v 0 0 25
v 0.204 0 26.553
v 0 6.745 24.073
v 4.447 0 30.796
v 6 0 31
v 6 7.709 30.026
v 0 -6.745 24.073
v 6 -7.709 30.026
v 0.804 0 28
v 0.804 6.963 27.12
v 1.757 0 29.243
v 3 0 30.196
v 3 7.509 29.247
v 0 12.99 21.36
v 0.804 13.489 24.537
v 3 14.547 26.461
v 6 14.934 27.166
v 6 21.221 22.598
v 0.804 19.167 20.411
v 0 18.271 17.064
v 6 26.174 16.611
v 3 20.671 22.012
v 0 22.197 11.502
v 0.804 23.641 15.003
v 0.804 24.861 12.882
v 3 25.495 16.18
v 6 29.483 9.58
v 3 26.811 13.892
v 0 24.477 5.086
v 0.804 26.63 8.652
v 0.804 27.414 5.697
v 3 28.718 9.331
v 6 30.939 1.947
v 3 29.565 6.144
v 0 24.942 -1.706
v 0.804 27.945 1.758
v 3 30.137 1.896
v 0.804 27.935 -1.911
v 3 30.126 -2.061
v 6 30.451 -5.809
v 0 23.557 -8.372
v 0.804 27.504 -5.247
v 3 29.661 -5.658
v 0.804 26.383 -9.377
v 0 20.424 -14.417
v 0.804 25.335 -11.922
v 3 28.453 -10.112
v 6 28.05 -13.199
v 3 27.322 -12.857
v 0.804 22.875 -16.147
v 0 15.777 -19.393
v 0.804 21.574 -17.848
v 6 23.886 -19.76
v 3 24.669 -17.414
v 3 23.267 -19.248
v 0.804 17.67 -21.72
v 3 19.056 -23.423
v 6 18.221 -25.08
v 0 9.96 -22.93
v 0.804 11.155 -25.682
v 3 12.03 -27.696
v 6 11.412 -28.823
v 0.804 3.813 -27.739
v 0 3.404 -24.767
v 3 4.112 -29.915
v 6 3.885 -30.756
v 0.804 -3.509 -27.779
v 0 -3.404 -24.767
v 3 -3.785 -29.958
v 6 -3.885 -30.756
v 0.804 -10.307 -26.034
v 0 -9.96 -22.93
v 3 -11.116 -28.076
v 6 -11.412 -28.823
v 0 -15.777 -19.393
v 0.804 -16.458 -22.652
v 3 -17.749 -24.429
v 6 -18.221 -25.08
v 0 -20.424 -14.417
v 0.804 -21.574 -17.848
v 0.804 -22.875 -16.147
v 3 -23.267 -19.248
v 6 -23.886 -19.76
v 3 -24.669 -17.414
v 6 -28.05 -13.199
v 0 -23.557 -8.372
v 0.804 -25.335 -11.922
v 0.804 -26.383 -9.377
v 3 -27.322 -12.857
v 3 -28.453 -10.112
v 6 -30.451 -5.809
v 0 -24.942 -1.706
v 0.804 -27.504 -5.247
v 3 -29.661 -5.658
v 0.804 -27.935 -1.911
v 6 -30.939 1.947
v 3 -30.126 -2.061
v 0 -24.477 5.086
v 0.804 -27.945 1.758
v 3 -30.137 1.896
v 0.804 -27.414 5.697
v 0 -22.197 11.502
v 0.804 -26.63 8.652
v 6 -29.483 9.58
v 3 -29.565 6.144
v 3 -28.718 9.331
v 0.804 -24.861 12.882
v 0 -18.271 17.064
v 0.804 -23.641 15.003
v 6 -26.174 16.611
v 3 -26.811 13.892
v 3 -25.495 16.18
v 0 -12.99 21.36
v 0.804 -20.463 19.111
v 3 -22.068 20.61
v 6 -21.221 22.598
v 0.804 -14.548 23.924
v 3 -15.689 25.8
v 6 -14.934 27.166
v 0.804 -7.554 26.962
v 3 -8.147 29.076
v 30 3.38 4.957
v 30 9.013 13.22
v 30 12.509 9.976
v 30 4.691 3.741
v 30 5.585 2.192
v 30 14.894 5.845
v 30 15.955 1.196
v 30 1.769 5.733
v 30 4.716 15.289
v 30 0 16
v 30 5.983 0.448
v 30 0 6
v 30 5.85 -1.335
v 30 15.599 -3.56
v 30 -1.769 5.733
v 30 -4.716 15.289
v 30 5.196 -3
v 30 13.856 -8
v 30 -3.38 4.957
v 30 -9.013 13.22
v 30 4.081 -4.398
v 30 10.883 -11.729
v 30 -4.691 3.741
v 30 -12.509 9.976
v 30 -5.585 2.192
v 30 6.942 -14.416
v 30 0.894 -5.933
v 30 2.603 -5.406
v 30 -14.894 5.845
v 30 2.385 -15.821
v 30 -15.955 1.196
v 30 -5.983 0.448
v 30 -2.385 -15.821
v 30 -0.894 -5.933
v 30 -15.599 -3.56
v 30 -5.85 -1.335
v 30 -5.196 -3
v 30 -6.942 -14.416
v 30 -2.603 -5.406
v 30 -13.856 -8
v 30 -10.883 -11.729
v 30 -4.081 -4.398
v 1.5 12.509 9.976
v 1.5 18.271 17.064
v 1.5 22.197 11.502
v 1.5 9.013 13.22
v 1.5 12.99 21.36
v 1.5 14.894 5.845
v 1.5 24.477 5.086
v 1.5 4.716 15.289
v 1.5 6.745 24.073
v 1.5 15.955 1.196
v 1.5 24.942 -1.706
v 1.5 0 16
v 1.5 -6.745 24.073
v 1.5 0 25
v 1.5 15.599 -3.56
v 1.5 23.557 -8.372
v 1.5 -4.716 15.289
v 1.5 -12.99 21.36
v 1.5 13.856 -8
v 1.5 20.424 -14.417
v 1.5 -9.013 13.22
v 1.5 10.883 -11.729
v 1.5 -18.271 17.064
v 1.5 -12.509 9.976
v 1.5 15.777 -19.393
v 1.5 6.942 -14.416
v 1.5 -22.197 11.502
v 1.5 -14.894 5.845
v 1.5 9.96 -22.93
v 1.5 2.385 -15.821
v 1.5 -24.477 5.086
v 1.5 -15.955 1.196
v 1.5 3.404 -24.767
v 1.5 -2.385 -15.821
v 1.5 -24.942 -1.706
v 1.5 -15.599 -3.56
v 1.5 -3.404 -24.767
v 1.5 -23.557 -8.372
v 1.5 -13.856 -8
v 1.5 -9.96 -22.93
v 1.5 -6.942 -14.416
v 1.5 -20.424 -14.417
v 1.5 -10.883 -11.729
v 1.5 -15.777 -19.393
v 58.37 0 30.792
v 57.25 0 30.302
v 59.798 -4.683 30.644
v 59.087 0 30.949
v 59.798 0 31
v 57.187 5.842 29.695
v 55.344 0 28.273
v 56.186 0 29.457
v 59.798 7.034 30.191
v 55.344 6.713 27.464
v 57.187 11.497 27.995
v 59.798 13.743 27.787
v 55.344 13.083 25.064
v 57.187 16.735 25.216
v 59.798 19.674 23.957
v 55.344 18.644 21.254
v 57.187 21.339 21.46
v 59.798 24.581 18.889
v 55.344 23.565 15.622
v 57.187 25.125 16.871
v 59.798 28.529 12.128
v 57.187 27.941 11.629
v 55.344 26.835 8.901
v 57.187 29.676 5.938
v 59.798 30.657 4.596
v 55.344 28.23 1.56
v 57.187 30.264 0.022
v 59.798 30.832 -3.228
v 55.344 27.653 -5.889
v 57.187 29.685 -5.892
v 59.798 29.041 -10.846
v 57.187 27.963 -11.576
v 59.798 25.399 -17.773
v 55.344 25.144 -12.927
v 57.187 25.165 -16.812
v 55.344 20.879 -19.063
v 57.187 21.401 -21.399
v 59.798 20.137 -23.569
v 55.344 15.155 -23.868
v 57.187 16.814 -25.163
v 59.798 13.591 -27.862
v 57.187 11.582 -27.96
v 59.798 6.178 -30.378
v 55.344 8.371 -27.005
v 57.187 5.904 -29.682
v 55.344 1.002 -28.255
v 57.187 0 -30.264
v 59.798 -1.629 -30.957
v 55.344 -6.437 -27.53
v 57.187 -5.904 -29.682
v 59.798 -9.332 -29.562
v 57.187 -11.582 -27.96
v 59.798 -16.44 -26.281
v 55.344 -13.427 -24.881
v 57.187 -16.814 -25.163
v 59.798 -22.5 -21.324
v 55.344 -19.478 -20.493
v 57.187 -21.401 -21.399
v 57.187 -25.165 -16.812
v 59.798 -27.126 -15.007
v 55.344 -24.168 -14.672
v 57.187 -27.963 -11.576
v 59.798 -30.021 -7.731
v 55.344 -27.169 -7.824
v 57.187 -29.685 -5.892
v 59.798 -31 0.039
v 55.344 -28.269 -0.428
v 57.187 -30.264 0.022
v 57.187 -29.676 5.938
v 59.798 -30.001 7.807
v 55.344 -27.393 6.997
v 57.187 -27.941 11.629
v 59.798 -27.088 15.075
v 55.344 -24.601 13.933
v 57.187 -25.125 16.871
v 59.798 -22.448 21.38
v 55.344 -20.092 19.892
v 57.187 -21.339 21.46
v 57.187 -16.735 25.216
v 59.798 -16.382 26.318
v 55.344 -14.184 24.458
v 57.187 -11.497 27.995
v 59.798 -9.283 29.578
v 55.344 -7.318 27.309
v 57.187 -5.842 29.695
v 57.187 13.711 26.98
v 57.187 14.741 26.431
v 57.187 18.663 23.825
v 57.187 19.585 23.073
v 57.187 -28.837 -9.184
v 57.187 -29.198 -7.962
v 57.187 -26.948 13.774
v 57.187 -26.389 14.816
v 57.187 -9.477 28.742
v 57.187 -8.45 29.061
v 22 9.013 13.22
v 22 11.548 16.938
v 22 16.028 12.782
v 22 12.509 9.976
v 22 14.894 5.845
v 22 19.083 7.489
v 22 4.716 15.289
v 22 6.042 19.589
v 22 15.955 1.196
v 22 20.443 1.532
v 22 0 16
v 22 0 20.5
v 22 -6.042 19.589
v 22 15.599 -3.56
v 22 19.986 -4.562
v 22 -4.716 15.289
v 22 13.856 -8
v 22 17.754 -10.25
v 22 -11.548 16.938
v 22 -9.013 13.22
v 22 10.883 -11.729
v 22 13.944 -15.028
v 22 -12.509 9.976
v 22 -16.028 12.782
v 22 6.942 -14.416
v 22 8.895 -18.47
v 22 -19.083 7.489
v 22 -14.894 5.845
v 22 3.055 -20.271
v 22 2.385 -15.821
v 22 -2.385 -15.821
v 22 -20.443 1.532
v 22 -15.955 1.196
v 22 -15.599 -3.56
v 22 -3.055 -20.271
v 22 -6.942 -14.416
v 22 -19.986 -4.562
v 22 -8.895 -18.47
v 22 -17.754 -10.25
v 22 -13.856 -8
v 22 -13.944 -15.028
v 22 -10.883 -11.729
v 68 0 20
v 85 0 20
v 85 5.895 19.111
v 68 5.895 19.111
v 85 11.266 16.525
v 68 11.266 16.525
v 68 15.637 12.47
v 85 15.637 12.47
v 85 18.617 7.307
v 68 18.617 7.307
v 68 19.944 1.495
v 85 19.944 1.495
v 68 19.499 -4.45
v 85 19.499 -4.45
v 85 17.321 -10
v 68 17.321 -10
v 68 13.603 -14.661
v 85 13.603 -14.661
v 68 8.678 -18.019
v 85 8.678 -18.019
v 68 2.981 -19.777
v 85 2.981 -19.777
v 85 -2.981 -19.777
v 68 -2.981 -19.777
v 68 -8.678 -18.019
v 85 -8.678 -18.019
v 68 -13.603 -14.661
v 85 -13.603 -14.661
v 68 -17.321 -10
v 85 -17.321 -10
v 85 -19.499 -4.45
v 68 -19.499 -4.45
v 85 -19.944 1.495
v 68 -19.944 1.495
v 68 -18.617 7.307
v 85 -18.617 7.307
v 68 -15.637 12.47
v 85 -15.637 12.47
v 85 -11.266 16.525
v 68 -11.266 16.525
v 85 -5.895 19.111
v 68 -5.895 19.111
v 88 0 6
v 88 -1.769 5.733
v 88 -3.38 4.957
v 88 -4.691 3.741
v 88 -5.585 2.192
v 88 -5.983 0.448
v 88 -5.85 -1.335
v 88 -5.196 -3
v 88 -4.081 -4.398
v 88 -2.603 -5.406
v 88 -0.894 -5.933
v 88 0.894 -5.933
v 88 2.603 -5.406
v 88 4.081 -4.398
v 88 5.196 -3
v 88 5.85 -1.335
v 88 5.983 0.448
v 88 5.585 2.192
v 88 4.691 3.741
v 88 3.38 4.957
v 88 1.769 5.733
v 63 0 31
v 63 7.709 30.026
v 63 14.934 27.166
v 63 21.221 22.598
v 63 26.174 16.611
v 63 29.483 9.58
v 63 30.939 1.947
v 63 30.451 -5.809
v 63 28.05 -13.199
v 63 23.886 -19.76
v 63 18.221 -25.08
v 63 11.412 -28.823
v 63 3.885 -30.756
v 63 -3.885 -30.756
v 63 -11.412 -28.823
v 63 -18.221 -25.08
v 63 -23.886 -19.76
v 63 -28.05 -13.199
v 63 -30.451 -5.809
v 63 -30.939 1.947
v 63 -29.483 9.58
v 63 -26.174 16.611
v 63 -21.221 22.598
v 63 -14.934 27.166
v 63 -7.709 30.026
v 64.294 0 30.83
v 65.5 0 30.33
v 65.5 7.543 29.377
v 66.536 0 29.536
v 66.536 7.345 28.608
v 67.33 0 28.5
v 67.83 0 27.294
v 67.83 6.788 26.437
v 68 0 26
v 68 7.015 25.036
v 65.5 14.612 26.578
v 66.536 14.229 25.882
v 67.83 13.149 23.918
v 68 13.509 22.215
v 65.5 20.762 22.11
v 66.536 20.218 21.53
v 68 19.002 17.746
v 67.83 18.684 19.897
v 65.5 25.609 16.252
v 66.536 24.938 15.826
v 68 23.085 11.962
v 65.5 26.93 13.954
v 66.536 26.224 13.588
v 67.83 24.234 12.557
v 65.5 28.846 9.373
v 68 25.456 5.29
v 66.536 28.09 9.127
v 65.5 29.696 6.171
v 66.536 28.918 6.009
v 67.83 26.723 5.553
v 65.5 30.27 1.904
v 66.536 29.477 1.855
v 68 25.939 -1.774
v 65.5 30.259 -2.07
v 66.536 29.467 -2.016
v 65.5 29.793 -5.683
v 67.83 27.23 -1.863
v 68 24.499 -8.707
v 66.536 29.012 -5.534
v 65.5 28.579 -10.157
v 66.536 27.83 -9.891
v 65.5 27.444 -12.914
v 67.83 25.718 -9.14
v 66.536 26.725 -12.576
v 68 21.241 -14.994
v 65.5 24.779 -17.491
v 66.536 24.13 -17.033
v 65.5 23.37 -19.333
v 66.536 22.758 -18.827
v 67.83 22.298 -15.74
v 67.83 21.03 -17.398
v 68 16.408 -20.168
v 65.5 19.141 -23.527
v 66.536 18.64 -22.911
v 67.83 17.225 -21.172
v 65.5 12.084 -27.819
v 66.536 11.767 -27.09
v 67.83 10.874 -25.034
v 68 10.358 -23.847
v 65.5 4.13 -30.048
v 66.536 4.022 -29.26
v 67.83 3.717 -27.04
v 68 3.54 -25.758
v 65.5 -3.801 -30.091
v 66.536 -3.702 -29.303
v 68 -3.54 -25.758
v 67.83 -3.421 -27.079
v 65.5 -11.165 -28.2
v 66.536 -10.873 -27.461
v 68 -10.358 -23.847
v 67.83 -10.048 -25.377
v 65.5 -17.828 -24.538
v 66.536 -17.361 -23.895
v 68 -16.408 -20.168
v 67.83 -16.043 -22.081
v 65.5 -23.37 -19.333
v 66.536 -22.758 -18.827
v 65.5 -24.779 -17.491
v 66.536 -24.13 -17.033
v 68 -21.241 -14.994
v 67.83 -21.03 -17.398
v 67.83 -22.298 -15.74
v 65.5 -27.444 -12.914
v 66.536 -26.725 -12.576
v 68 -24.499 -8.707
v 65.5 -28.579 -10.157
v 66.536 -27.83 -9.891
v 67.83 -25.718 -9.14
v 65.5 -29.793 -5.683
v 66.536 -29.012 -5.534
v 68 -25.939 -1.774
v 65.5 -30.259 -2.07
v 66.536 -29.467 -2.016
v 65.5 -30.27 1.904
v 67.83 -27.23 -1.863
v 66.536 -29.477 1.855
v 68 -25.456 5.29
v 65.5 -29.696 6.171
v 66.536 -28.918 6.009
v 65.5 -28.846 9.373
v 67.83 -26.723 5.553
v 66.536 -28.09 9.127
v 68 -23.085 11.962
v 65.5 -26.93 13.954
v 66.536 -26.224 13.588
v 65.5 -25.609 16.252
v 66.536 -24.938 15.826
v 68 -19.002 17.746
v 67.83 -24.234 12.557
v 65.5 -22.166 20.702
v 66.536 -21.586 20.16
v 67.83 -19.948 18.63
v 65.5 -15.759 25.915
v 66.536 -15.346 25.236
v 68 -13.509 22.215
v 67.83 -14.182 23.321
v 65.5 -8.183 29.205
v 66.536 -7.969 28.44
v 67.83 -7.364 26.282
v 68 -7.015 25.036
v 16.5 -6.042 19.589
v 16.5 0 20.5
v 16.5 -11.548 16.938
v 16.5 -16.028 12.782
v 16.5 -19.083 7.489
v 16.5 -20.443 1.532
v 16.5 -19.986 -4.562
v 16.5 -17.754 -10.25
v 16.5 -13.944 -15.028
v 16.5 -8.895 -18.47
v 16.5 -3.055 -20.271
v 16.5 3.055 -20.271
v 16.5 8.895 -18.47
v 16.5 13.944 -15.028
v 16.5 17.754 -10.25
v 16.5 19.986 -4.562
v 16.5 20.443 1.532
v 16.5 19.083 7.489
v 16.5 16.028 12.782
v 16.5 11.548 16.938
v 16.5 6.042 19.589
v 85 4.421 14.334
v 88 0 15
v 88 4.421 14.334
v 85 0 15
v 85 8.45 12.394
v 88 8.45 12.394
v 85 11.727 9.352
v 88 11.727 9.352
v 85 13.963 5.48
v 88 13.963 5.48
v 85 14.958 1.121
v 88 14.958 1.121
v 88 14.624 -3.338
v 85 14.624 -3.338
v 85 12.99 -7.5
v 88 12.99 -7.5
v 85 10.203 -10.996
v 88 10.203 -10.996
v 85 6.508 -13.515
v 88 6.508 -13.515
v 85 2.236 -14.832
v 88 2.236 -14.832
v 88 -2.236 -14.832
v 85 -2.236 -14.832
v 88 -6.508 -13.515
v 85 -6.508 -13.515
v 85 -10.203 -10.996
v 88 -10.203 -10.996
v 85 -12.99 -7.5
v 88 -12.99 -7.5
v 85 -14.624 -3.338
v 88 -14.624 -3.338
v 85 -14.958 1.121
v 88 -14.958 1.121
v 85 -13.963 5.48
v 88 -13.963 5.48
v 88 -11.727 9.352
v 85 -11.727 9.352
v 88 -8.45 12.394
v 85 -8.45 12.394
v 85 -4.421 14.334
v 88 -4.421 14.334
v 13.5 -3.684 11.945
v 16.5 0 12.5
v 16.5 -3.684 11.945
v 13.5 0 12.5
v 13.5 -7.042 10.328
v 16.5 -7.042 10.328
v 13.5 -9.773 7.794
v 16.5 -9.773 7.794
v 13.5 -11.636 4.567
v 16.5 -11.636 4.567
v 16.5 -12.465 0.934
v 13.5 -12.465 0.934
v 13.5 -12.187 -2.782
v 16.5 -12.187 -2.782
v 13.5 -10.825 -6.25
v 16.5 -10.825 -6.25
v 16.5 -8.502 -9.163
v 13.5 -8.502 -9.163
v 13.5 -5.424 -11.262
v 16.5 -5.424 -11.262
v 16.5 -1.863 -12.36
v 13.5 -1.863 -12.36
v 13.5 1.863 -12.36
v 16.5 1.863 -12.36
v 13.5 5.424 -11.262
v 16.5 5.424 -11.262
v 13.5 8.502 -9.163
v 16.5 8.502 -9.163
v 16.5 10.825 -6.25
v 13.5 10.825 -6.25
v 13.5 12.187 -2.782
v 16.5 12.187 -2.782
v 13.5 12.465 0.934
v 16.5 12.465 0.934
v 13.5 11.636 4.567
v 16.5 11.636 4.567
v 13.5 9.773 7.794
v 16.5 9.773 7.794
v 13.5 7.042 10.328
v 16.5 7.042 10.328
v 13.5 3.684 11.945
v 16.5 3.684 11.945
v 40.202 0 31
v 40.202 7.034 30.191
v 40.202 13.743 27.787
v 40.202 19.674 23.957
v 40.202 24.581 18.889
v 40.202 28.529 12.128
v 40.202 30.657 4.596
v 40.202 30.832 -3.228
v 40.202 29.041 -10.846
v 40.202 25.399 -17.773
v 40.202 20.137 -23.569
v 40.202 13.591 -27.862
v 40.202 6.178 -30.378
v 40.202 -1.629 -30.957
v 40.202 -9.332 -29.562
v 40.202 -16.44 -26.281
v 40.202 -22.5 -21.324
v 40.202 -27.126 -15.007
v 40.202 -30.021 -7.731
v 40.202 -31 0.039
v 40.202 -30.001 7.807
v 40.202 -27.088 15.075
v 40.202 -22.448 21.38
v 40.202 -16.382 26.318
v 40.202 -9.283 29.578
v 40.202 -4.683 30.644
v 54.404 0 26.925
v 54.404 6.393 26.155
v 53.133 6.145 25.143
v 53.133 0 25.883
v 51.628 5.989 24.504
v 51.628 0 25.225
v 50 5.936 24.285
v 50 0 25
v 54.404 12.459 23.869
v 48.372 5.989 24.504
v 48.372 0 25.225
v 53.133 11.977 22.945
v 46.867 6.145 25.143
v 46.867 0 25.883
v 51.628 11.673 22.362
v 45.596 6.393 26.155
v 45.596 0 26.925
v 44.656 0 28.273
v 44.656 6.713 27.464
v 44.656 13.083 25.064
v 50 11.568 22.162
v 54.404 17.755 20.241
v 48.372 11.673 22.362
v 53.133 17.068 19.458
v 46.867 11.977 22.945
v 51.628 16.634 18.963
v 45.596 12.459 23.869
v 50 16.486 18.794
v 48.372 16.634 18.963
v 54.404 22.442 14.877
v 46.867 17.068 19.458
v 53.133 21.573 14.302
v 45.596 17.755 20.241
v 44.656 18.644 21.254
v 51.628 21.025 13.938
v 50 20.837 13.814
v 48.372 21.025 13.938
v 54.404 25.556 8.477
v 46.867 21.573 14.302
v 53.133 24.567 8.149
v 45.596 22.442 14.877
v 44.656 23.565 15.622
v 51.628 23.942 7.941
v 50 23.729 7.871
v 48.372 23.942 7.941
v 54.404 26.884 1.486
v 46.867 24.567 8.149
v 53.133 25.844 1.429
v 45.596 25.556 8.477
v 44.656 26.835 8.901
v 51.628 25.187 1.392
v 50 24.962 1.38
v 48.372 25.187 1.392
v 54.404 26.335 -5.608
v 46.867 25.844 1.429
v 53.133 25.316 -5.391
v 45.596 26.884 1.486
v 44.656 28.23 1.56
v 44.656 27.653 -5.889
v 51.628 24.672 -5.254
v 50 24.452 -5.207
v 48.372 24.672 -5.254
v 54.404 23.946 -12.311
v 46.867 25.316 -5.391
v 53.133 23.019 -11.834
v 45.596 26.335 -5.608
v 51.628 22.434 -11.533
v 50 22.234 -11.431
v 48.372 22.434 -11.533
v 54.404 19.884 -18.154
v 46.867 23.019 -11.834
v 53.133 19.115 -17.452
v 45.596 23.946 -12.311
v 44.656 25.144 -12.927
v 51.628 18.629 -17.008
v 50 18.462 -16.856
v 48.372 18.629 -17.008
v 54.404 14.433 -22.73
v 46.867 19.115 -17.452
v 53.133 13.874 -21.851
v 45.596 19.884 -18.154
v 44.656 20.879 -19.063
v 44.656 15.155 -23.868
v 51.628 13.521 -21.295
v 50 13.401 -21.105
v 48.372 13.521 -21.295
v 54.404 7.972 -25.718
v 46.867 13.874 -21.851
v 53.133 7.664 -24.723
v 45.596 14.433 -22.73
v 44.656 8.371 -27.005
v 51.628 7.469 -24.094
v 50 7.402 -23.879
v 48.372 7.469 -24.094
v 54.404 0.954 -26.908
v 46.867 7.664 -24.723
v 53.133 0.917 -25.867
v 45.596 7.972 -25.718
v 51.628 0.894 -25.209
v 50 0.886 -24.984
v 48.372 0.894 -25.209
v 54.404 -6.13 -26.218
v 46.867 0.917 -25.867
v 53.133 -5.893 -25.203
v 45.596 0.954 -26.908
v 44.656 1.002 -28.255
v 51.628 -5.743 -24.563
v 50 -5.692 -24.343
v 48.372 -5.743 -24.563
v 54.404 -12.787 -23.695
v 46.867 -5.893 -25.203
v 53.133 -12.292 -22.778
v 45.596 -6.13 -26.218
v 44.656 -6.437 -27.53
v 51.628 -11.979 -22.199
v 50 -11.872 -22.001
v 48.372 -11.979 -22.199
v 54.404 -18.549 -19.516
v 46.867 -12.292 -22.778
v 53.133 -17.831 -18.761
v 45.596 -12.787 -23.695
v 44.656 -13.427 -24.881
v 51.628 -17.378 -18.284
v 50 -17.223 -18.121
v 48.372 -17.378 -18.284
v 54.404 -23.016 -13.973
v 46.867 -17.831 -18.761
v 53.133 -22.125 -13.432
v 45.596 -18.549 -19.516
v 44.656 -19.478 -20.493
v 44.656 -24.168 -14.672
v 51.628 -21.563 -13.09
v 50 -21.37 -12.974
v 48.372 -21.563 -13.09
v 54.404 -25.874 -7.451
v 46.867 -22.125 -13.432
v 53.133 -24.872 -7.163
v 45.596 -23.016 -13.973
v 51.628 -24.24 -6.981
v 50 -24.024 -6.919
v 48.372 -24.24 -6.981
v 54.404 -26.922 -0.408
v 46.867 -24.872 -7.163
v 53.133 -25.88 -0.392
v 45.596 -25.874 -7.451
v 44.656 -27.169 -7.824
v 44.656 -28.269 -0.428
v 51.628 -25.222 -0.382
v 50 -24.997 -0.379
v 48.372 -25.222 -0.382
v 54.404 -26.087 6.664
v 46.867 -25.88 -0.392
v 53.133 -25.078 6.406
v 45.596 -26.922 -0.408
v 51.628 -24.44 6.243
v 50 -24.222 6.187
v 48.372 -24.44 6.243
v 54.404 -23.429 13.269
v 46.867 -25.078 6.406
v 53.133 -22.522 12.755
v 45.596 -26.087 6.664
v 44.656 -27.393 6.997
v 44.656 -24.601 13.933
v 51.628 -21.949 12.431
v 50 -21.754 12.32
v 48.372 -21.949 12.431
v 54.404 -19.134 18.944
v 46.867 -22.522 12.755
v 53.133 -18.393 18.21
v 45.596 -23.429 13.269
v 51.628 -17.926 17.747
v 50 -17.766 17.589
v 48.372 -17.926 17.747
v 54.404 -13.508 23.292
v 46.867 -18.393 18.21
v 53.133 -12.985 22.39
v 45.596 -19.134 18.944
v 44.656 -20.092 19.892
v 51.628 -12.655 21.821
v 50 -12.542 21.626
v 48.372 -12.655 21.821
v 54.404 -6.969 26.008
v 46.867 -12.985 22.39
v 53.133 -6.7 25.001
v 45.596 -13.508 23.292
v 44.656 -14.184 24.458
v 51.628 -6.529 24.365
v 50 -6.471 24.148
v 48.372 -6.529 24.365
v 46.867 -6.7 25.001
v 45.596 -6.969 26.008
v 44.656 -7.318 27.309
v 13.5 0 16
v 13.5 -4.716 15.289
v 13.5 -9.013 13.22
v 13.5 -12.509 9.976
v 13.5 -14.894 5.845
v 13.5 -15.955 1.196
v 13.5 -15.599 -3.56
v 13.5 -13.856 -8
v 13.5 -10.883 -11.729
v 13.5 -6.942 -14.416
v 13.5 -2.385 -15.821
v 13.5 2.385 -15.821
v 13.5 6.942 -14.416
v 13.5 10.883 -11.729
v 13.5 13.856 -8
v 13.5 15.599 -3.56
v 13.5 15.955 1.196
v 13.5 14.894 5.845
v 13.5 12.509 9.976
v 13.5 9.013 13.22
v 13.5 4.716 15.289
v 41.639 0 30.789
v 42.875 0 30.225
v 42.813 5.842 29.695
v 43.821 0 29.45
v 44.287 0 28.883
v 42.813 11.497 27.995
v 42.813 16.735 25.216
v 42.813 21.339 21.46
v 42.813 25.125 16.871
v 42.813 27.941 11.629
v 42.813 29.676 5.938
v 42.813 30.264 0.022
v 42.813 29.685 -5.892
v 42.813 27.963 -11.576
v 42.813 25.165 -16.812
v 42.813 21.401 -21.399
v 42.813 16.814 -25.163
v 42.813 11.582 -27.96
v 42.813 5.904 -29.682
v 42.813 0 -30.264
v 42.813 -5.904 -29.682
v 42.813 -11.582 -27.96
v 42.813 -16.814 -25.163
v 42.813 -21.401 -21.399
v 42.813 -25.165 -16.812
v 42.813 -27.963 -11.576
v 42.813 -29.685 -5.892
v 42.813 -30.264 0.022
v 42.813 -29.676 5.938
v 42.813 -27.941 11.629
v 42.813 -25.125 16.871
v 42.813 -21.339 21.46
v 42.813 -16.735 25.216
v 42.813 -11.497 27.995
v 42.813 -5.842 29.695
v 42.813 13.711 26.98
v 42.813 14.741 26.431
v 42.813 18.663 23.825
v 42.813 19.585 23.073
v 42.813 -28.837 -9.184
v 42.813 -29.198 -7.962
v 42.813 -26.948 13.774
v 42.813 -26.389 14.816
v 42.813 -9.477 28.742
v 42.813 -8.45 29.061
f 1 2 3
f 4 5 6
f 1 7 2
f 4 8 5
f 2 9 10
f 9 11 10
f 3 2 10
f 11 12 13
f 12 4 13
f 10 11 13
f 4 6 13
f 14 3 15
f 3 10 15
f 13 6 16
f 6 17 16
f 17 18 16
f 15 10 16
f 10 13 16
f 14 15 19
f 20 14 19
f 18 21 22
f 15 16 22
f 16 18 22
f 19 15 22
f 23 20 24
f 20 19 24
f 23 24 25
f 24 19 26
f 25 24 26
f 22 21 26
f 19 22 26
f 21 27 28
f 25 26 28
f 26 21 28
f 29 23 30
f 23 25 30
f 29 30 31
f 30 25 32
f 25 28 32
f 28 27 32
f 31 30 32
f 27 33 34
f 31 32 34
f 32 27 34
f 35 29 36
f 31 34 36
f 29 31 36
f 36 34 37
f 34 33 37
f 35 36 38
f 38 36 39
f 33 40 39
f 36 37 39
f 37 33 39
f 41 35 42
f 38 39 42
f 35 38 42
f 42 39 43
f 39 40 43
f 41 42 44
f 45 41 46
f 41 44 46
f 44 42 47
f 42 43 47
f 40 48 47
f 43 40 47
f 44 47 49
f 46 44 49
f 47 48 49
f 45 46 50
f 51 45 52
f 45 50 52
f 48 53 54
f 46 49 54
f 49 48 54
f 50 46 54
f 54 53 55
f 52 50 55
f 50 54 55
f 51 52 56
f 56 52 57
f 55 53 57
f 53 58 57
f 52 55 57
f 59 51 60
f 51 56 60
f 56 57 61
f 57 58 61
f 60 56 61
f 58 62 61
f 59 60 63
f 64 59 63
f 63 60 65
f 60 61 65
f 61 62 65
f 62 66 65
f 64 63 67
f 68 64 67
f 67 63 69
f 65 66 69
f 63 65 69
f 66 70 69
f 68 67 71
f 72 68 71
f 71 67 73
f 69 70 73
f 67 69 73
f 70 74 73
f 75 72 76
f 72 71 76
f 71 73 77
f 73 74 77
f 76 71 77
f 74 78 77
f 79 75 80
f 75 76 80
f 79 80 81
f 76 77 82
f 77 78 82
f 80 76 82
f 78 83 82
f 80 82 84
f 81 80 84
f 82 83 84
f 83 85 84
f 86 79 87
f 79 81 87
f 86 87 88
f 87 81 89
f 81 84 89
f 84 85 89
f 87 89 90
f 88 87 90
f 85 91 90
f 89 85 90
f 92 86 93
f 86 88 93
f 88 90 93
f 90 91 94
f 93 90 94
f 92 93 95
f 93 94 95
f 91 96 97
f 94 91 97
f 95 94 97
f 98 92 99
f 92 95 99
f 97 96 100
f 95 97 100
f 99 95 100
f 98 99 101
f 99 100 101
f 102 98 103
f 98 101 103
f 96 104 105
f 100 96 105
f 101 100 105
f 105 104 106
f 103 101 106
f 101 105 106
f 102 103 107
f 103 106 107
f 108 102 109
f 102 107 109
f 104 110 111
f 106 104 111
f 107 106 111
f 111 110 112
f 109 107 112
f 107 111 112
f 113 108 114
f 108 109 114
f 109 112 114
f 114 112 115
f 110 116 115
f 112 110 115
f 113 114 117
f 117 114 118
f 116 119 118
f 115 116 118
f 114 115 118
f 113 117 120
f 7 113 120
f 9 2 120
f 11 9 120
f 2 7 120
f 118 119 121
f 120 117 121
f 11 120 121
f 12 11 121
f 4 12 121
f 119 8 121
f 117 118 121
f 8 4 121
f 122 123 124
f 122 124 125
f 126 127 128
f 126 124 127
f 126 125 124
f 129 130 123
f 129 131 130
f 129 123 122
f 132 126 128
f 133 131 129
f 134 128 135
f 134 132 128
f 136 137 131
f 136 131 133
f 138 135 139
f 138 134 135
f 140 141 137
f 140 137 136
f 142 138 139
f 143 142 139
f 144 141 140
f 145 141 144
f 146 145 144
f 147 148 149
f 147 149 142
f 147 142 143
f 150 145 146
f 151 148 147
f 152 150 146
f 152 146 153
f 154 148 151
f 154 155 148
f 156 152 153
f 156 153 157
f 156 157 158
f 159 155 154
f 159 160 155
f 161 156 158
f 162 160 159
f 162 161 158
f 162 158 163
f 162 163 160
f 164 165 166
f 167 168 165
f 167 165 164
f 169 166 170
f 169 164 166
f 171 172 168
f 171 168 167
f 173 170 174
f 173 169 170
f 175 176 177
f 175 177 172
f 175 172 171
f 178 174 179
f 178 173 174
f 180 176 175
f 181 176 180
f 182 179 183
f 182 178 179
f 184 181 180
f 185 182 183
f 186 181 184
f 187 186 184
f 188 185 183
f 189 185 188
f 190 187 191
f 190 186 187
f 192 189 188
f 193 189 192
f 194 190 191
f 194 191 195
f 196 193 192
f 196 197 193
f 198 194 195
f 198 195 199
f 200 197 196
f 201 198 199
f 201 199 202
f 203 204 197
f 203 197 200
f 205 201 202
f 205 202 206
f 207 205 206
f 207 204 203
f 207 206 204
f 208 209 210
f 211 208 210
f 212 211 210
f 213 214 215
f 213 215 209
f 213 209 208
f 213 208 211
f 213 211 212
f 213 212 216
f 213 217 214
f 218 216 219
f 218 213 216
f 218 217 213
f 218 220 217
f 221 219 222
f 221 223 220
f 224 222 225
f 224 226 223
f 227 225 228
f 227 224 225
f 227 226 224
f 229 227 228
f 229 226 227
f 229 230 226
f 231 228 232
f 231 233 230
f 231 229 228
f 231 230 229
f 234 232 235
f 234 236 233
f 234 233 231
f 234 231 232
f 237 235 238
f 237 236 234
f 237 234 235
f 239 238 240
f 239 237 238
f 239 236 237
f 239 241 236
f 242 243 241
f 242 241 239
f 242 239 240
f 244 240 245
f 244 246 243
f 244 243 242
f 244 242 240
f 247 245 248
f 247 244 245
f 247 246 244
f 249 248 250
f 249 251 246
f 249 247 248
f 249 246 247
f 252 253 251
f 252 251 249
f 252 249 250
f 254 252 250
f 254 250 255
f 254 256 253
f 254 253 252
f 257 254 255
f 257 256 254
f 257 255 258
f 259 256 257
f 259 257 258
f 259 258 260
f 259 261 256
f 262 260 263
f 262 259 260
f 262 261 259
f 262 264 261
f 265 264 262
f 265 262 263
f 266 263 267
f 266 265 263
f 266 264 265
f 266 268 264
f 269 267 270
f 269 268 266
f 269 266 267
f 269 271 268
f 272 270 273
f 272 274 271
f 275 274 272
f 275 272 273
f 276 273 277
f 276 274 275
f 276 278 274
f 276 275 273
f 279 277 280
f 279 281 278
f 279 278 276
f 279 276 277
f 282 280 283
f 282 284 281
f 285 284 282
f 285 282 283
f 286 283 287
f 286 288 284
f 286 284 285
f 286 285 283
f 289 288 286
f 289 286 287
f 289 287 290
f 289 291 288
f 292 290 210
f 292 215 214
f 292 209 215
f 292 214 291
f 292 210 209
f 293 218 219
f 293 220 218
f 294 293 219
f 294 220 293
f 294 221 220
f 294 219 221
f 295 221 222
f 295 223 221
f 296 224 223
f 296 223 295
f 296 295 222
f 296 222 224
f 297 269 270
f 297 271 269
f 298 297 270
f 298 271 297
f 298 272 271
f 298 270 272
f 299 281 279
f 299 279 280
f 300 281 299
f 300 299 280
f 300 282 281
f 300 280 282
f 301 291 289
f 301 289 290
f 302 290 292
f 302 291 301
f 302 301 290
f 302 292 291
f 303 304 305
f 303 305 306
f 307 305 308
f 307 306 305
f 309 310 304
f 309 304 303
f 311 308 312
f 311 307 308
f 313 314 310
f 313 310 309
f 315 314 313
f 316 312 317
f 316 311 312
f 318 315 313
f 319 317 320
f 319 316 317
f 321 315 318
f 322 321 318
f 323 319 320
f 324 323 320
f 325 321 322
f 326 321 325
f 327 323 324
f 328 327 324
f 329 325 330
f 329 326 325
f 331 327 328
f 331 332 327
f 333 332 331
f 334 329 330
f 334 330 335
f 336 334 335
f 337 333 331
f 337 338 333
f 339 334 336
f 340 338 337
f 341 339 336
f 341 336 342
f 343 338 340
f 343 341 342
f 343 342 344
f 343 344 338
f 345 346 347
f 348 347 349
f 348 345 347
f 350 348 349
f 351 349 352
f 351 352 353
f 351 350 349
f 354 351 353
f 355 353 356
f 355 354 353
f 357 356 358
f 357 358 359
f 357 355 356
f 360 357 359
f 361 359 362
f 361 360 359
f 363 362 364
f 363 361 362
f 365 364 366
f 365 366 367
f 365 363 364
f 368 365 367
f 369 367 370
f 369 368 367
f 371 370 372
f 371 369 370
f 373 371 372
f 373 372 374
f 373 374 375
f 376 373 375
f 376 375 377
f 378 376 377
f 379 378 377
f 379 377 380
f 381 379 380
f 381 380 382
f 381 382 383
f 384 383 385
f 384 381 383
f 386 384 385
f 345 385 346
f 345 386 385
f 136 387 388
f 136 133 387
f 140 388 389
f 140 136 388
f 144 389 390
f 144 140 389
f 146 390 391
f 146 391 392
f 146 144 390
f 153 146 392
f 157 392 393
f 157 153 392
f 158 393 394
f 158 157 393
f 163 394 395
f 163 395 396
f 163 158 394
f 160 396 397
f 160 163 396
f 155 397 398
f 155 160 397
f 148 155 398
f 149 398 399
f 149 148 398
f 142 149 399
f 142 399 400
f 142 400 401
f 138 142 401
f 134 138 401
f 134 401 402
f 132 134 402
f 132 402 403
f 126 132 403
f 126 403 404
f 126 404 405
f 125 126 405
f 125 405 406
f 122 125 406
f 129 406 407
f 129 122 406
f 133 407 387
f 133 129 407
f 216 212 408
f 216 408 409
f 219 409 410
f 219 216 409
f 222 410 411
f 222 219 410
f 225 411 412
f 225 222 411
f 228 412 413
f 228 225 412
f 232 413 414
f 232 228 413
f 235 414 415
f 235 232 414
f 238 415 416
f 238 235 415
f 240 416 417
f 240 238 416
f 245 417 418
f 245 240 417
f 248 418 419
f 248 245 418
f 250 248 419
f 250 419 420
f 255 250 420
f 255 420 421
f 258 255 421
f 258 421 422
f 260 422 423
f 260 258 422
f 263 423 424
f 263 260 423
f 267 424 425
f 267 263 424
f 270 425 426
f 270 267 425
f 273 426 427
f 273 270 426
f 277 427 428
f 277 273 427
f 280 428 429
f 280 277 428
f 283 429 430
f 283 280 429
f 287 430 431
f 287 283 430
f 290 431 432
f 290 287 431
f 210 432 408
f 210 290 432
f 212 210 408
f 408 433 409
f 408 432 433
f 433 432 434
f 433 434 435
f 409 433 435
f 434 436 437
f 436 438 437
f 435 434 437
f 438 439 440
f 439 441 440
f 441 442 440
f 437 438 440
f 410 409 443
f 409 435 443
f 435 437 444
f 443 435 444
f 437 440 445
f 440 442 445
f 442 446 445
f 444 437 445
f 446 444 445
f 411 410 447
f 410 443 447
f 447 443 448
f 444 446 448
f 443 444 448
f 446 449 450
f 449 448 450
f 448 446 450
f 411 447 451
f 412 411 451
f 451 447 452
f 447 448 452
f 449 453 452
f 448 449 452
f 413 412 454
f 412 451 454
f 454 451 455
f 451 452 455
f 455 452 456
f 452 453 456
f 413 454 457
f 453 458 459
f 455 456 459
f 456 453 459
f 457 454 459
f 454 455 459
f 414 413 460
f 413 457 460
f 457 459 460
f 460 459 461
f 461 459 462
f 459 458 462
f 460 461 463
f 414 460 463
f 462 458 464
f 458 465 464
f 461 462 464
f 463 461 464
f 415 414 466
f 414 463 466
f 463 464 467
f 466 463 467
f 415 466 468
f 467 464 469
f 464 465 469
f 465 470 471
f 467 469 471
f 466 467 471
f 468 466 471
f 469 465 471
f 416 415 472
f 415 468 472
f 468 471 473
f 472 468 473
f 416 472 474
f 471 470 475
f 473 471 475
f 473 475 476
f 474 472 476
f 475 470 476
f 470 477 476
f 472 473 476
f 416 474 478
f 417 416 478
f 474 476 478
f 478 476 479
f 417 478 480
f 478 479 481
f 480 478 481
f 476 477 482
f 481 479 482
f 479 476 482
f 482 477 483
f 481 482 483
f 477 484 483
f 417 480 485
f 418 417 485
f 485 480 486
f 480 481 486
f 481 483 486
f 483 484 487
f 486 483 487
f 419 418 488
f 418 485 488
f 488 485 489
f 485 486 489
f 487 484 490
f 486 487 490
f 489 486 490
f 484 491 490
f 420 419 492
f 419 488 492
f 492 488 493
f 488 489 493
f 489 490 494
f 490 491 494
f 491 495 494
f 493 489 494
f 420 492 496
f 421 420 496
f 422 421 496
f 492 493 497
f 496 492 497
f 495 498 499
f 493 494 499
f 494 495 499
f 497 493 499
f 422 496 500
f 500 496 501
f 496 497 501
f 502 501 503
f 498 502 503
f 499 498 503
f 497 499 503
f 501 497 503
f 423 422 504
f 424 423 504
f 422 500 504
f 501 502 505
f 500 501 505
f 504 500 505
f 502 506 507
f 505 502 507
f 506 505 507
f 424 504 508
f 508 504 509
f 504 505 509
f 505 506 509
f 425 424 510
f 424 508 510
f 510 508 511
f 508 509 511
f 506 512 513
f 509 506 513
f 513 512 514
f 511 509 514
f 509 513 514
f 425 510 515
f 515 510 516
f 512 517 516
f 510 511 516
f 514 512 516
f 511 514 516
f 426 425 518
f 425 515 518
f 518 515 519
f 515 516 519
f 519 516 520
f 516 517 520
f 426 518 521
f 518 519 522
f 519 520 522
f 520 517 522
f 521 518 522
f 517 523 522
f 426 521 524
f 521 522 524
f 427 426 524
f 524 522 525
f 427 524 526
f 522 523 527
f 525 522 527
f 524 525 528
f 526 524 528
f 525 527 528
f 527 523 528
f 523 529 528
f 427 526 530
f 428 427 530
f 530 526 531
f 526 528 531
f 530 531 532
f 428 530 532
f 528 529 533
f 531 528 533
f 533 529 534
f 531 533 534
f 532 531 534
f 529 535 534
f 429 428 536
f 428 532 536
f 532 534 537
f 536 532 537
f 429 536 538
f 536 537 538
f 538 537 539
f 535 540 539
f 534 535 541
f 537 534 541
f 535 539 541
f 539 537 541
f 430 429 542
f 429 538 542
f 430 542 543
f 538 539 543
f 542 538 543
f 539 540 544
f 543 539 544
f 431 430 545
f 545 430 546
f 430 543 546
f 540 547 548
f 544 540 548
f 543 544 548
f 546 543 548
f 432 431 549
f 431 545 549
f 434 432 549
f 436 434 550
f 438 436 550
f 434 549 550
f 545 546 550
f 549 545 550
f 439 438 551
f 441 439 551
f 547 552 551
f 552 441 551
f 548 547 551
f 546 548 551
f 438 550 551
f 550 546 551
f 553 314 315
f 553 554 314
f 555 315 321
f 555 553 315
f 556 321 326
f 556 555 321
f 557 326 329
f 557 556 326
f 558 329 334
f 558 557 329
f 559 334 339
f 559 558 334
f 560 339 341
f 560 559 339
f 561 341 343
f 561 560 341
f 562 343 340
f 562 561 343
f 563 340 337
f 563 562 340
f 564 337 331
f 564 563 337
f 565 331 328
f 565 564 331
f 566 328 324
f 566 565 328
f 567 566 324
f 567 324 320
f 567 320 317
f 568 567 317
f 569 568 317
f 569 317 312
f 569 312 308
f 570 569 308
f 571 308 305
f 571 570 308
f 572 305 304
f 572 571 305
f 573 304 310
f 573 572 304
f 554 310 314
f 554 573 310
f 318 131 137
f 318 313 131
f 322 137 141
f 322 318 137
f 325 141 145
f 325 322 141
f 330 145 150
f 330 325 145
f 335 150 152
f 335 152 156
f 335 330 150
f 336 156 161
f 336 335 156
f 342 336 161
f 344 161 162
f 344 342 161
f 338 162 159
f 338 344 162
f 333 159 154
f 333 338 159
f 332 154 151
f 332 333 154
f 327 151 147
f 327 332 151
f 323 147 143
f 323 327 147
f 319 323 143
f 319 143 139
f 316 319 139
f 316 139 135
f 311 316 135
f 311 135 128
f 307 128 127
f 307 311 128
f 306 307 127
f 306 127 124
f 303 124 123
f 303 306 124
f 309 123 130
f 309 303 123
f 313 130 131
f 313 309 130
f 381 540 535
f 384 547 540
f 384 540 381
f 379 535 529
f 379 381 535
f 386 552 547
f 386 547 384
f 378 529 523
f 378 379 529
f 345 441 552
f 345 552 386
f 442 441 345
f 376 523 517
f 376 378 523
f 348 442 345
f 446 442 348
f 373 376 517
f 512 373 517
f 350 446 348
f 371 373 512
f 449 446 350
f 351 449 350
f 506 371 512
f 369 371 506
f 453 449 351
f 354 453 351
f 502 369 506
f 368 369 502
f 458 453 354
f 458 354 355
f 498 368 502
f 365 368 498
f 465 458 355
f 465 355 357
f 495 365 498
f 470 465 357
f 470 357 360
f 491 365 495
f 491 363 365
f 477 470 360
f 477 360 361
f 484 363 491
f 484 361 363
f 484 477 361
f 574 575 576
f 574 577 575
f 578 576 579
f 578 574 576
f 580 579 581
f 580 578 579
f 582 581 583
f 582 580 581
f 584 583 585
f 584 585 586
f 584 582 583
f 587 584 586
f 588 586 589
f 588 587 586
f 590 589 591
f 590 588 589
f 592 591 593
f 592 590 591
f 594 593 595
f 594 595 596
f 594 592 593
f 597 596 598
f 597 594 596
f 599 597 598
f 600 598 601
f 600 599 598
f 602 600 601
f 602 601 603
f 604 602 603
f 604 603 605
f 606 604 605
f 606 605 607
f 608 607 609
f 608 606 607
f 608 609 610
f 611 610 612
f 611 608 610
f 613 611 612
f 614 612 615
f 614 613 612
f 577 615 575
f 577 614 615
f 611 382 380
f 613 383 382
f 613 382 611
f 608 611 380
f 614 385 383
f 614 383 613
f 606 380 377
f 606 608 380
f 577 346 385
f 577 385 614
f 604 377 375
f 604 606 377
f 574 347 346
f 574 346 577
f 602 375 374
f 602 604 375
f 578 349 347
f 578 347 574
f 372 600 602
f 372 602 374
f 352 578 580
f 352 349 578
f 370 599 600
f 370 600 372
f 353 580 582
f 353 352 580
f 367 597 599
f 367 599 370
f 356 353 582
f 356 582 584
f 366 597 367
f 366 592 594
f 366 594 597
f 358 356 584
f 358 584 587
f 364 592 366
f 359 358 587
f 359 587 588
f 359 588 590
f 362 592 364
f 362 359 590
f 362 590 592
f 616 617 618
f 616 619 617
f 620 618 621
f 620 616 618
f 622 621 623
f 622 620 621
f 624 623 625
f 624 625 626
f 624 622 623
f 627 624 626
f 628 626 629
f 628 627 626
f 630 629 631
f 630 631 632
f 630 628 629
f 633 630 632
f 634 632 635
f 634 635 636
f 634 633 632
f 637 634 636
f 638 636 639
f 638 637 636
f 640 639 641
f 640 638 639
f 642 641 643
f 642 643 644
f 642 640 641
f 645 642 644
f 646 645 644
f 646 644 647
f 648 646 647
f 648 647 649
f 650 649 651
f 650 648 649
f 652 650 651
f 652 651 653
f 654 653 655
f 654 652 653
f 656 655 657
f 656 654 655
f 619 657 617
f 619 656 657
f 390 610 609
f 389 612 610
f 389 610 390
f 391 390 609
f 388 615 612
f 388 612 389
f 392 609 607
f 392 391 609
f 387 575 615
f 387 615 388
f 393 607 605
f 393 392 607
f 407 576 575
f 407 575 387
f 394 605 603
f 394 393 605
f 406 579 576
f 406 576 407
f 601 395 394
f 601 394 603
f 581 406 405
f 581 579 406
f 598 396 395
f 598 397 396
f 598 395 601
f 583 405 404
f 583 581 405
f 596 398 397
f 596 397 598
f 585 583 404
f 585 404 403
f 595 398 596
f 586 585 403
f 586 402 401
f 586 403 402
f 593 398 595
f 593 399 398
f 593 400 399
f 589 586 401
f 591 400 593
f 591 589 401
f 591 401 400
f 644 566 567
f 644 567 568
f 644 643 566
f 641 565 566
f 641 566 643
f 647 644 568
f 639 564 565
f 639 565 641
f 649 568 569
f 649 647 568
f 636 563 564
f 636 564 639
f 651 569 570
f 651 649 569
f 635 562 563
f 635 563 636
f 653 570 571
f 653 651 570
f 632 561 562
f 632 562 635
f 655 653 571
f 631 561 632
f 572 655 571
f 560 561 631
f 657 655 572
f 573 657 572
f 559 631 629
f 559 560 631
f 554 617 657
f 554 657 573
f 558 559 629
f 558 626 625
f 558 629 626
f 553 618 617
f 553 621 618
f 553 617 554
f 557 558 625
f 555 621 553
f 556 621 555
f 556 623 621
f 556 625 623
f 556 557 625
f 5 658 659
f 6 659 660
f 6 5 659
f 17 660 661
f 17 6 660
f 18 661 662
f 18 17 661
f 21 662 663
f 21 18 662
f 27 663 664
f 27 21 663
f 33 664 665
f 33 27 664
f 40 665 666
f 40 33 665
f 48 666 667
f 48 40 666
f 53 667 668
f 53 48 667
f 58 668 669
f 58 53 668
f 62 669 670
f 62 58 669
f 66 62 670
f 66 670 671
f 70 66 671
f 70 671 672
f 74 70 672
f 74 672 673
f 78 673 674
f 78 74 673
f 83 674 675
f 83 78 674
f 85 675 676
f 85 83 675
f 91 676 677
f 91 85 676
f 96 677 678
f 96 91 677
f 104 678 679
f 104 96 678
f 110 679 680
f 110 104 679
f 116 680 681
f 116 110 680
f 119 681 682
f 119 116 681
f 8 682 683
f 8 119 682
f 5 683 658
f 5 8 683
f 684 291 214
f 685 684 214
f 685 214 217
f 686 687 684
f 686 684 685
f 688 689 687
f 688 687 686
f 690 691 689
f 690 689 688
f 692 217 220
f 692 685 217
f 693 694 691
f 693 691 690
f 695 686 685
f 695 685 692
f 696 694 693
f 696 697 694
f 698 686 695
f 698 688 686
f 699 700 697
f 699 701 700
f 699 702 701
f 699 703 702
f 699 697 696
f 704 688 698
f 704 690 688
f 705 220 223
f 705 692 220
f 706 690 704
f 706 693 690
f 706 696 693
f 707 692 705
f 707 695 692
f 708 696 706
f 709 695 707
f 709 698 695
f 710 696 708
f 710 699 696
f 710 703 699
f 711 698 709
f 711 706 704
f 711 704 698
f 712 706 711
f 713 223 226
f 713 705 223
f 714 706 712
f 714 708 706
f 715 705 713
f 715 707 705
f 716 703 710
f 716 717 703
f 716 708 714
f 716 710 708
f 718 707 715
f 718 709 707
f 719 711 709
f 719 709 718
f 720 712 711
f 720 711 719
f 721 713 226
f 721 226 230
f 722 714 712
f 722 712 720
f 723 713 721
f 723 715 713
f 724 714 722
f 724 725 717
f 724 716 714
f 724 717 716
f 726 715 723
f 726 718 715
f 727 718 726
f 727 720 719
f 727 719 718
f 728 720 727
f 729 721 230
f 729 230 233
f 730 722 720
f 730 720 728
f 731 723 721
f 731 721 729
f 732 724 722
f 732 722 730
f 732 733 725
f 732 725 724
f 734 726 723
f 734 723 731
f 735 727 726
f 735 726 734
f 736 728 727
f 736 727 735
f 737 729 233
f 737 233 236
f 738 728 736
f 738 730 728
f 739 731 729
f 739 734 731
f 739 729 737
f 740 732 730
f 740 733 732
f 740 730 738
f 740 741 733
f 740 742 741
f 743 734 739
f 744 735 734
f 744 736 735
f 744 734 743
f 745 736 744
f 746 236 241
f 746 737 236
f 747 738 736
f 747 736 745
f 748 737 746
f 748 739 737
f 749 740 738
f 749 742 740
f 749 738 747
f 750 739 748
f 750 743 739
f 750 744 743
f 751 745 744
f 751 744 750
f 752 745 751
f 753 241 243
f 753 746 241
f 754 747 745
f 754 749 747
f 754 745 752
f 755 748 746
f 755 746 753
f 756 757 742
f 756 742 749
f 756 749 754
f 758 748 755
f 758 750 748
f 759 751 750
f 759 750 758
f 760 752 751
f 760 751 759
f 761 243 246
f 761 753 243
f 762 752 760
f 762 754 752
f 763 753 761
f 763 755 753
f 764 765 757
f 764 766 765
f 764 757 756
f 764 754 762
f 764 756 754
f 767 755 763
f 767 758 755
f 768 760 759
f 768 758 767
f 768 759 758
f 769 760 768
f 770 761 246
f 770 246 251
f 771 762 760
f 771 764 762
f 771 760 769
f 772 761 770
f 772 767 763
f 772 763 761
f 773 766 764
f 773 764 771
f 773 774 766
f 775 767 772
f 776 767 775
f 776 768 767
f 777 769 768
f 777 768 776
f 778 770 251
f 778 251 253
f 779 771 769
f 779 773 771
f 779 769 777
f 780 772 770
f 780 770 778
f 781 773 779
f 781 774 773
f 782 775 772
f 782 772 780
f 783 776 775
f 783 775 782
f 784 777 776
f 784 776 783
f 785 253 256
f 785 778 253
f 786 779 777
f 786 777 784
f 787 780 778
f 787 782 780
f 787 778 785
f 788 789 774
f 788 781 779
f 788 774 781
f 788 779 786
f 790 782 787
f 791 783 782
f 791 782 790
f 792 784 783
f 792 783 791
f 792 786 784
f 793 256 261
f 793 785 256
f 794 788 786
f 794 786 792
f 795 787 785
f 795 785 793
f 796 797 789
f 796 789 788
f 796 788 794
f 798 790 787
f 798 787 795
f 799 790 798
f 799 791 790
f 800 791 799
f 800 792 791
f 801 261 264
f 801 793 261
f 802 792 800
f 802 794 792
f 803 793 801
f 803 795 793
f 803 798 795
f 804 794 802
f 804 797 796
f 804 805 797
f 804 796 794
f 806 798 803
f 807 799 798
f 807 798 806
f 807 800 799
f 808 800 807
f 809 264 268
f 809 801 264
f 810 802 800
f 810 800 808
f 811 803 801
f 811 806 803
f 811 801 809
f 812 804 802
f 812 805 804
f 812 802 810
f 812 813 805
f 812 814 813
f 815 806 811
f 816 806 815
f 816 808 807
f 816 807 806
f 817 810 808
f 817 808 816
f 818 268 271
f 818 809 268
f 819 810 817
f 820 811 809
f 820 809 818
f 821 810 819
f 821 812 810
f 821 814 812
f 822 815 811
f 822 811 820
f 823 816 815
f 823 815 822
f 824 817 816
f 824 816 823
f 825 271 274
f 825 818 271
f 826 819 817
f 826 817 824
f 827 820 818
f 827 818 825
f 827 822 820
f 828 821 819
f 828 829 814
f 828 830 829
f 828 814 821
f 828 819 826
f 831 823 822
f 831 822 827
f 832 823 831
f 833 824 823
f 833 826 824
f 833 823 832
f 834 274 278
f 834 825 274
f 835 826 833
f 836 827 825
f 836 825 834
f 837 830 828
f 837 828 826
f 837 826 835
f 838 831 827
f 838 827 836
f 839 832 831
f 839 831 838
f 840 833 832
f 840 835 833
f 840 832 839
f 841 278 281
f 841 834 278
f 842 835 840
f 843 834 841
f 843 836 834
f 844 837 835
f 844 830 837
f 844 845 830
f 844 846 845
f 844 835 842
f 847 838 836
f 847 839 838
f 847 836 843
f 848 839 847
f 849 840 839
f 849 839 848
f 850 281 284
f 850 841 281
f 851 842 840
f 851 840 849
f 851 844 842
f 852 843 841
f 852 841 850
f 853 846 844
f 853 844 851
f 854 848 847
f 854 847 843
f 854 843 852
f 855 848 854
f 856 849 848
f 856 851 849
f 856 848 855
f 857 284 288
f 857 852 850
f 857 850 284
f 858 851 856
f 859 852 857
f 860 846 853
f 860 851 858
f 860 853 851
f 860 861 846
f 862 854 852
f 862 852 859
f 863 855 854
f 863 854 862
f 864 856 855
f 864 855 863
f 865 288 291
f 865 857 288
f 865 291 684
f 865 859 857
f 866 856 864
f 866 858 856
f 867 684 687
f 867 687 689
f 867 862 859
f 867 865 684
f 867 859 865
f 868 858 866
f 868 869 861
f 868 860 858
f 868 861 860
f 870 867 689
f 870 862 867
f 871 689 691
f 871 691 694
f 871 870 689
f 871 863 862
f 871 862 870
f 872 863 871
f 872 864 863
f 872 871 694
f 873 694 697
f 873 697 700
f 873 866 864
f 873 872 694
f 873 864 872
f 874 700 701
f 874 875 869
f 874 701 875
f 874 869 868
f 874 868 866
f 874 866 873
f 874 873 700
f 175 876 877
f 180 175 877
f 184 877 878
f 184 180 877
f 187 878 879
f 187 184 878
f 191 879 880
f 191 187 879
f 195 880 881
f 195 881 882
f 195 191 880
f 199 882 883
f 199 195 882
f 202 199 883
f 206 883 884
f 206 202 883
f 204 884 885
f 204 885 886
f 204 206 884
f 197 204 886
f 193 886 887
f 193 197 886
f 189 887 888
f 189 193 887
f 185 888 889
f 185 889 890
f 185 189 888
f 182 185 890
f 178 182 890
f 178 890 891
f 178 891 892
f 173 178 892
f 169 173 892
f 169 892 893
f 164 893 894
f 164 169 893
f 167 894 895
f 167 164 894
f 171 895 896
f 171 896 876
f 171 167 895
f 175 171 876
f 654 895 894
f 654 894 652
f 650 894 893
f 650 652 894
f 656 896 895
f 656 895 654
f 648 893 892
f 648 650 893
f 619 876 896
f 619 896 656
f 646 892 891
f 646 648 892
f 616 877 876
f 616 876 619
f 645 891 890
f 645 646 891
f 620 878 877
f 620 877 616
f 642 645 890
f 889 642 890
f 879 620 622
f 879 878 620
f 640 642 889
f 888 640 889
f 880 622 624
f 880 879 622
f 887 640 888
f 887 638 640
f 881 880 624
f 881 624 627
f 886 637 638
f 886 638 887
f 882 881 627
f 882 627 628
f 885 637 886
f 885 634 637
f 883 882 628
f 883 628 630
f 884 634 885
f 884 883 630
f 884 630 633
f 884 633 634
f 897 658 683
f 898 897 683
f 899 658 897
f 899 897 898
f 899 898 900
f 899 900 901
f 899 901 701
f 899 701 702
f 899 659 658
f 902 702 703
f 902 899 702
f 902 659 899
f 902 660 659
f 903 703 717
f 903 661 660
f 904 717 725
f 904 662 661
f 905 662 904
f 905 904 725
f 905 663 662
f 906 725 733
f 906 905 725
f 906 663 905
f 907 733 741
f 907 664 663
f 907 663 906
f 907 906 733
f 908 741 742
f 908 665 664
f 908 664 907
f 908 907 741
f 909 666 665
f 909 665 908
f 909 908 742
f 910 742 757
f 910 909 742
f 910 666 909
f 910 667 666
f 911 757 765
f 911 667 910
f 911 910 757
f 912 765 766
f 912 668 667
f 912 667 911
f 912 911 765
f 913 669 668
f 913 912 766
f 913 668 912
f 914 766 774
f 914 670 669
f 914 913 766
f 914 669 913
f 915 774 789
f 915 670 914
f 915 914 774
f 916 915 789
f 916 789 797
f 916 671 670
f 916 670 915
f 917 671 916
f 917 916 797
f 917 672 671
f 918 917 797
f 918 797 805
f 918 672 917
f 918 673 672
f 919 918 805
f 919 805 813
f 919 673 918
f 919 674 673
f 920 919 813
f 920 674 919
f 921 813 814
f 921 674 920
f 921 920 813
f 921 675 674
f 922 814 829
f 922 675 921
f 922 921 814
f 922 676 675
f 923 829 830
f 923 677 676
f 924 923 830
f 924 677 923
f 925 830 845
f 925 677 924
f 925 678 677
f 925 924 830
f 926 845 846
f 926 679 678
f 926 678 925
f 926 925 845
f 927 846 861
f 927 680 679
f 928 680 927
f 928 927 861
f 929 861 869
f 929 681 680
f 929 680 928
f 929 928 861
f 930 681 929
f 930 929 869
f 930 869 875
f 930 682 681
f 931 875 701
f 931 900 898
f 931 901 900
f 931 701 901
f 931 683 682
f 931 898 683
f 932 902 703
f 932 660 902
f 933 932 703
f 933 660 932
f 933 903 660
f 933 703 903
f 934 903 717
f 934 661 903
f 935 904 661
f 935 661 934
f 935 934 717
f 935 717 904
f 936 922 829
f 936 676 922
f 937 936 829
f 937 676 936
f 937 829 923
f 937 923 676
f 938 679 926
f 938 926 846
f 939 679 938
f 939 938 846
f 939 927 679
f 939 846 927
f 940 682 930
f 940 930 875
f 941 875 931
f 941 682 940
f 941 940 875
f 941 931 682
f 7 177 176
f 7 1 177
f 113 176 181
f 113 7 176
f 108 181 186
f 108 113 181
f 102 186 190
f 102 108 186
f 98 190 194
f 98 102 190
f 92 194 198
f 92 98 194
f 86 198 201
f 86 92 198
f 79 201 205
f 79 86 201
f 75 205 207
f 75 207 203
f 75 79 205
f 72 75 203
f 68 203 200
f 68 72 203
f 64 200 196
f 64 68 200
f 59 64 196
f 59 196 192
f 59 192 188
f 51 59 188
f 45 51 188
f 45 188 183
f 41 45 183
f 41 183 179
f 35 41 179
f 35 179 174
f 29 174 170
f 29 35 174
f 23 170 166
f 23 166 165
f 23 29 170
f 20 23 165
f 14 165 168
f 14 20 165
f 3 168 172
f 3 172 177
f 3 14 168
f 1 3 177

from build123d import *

# Parameters (mm, degrees)
F4_R = 5.99999
F5_R = 5
F6_R = 5


# Not quite as in the source:
# - a fillet or chamfer is up to 0.001 mm smaller than in the source, because OpenCascade refuses the exact size


with BuildPart() as f1:
    # F0 (on Front) → F1 (revolve)
    with BuildSketch(Plane.XZ):
        with BuildLine():
            Line((0, 31), (0, 0))
            Line((0, 0), (88, 0))
            Line((88, 0), (88, 15))
            Line((88, 15), (85, 15))
            Line((85, 15), (85, 20))
            Line((85, 20), (68, 20))
            Line((68, 20), (68, 31))
            Line((68, 31), (56, 31))
            ThreePointArc((56, 31), (50, 25), (44, 31))
            Line((44, 31), (0, 31))
        make_face()
    revolve(axis=Axis((44, 0, 0), (-1, 0, 0)))

    # F2 (on Front) → F3 (revolve, cut)
    with BuildSketch(Plane.XZ):
        Polygon((0, 25), (0, 0), (88, 0), (88, 6), (30, 6), (30, 16), (22, 16), (22, 20.5), (16.5, 20.5), (16.5, 12.5), (13.5, 12.5), (13.5, 16), (1.5, 16), (1.5, 25), align=None)
    revolve(axis=Axis((44.884205035, 0, 0), (1, 0, 0)), mode=Mode.SUBTRACT)

    # F4 (radius 6 in the source; OpenCascade refuses exactly that, so slightly less here)
    f4_edges = [f1.edges().sort_by_distance(p)[0] for p in [
        (0, 0, -31),
    ]]
    fillet(f4_edges, radius=F4_R)

    # F5
    f5_edges = [f1.edges().sort_by_distance(p)[0] for p in [
        (44, 0, -31),
        (56, 0, -31),
    ]]
    fillet(f5_edges, radius=F5_R)

    # F6
    f6_edges = [f1.edges().sort_by_distance(p)[0] for p in [
        (68, 0, -31),
    ]]
    fillet(f6_edges, radius=F6_R)


solid = f1.part
